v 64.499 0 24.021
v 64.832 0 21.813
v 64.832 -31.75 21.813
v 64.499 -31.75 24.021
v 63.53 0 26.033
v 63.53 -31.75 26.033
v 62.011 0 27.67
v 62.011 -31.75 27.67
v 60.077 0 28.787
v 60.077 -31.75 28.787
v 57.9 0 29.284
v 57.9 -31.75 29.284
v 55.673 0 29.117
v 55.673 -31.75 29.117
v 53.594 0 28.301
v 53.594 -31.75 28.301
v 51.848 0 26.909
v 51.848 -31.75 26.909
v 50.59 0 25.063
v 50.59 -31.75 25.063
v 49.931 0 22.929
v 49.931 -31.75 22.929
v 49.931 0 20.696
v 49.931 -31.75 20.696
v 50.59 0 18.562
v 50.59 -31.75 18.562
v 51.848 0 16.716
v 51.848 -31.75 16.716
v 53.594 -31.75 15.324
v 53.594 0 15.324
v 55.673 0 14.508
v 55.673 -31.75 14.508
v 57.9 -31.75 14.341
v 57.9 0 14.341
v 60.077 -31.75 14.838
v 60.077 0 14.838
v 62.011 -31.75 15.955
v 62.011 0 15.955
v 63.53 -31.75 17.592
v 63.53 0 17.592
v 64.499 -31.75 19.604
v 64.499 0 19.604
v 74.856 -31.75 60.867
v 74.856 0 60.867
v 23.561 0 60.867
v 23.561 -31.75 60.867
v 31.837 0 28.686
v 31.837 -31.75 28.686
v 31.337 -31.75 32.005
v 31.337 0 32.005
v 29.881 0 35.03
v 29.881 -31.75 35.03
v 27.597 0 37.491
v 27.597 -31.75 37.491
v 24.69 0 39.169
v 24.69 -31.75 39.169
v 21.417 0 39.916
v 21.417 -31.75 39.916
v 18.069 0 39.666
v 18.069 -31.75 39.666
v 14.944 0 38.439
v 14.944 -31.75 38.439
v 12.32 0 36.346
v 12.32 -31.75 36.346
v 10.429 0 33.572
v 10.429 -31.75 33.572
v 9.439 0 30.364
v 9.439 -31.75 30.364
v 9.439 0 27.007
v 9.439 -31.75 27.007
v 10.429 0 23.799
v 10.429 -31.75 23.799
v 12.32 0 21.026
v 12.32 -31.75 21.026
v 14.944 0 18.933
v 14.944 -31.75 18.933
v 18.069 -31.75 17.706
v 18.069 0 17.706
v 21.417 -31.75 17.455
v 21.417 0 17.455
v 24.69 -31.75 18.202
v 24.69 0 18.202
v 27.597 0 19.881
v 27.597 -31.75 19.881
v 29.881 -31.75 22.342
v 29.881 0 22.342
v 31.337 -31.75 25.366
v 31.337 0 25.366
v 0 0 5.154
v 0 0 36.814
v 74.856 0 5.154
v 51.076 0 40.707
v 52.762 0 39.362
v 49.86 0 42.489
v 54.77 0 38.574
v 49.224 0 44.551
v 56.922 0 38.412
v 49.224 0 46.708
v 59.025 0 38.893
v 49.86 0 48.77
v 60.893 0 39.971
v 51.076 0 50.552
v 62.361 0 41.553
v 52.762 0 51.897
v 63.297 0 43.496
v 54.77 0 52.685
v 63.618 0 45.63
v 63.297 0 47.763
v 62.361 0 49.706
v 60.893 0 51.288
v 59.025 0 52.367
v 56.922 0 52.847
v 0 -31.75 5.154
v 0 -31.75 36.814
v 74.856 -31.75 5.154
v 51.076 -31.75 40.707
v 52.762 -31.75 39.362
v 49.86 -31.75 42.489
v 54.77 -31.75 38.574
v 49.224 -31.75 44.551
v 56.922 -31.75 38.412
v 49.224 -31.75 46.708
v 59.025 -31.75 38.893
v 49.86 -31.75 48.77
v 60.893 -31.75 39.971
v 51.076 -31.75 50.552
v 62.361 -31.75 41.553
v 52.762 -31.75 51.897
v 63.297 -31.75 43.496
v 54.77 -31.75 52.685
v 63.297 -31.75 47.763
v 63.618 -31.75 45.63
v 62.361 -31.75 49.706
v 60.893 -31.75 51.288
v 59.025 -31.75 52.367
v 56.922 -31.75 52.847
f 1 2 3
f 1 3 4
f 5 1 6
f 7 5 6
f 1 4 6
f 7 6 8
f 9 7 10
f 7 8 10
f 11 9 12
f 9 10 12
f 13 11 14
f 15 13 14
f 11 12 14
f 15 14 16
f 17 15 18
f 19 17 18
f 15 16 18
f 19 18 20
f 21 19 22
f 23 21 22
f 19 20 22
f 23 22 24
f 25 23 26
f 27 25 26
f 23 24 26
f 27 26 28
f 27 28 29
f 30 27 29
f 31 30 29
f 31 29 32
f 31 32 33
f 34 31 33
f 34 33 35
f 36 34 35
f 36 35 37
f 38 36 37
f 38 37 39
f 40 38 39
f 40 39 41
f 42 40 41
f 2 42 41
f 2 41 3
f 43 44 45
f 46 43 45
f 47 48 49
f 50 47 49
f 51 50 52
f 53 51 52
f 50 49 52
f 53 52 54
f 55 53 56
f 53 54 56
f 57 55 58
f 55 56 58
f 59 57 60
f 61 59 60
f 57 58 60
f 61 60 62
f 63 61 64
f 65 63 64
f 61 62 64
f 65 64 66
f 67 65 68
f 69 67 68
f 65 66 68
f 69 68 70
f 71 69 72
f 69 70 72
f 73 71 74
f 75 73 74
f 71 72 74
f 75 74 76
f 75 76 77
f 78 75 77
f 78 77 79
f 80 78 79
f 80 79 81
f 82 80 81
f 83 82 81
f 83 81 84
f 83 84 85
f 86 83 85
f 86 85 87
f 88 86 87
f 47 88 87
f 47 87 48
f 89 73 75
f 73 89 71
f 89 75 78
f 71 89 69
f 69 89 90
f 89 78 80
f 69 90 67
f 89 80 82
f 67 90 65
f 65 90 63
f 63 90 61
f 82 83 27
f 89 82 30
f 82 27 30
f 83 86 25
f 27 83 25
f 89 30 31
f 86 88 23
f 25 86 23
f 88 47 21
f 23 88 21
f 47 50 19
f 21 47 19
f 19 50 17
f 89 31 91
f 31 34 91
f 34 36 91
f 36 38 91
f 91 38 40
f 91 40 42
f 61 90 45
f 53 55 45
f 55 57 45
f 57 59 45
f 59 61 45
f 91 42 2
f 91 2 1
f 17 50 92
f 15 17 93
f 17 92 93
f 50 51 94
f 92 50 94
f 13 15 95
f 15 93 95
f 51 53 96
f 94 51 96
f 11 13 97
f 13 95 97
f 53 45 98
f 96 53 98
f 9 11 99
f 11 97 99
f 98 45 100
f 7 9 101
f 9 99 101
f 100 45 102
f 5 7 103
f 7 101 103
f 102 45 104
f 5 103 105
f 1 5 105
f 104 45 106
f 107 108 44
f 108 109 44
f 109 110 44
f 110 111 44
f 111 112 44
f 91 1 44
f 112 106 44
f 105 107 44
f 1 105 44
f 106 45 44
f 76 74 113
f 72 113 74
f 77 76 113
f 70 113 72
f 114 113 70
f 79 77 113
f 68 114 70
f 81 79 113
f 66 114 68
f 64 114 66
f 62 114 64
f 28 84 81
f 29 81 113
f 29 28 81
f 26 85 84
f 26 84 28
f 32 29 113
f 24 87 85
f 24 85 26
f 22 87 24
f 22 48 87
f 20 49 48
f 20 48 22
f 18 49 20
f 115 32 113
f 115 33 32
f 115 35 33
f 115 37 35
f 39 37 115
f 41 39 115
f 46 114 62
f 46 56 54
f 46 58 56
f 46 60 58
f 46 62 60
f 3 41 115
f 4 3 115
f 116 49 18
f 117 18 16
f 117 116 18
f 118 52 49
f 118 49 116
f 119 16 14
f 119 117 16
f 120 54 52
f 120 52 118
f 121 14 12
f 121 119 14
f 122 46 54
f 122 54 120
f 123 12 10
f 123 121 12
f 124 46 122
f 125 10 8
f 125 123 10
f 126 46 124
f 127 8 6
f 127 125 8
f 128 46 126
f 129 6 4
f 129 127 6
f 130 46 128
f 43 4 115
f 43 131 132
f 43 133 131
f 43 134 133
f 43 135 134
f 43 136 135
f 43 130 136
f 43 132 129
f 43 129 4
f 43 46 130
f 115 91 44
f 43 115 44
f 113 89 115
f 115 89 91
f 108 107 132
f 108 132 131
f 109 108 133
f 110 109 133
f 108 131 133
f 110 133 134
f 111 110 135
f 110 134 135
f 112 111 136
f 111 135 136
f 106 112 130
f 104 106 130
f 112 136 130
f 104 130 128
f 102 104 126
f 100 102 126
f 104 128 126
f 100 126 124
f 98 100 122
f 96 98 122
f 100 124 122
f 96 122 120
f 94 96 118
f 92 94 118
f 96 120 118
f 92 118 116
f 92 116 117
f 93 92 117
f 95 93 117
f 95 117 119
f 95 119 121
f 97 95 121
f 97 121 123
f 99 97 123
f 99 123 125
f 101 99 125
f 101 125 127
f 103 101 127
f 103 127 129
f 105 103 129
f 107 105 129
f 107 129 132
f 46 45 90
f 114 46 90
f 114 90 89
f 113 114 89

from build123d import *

# Parameters (mm, degrees)
F1_DEPTH = 31.75
F2_R     = 7.237328
F2_R_2   = 7.492319
F2_R_3   = 11.262041
F3_DEPTH = 76.2


with BuildPart() as f1:
    # F0 (on Front) → F1 (new body)
    with BuildSketch(Plane.XZ):
        Polygon((23.56123, 60.866501), (0, 36.814418), (0, 5.154018), (74.855983, 5.154018), (74.855983, 60.866501), align=None)
    extrude(amount=F1_DEPTH)

    # F2 (on face) → F3 (cut)
    with BuildSketch(Plane.XZ.offset(31.75)):
        with Locations((56.380846, 45.629557)):
            Circle(F2_R)
        with Locations((57.339922, 21.812528)):
            Circle(F2_R_2)
        with Locations((20.575382, 28.685898)):
            Circle(F2_R_3)
    extrude(amount=-F3_DEPTH, mode=Mode.SUBTRACT)


solid = f1.part
